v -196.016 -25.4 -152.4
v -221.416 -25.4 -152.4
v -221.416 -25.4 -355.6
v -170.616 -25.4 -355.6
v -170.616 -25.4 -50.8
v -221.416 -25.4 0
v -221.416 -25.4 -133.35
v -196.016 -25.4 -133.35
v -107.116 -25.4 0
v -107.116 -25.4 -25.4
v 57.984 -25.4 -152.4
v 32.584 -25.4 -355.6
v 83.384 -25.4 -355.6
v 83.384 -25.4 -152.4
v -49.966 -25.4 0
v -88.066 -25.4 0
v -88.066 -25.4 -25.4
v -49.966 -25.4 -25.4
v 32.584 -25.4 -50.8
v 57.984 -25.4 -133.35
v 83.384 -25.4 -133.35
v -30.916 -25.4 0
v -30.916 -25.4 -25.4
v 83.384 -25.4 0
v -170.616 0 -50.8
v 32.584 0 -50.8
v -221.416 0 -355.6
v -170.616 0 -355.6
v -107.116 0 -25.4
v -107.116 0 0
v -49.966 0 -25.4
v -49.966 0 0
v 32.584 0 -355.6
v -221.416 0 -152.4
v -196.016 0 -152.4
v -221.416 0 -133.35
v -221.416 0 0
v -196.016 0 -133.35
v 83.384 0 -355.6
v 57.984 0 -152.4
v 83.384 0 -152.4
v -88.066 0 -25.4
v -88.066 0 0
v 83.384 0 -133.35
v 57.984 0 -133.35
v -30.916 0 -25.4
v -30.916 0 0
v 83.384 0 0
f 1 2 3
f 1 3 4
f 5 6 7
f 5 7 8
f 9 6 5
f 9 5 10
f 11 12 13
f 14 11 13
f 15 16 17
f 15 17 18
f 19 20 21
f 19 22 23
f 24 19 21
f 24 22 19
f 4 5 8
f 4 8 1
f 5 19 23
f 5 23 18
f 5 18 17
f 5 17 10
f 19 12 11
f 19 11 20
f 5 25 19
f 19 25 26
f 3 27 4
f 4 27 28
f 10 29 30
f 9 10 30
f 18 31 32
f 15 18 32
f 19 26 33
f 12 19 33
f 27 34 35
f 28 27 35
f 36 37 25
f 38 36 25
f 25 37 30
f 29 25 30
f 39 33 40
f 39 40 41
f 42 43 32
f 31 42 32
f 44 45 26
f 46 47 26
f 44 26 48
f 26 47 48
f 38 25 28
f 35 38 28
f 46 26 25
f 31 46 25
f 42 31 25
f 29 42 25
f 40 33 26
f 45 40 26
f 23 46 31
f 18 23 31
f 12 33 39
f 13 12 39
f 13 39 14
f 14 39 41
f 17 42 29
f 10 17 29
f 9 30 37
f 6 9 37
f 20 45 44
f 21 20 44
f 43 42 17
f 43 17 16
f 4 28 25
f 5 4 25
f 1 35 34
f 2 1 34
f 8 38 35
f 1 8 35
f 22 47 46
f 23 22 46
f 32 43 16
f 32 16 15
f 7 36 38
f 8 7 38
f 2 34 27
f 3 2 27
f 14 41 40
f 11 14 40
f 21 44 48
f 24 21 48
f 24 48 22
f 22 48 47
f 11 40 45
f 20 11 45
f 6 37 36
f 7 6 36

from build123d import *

# Parameters (mm, degrees)
F0_W     = 50.8
F0_H     = 50.8
F0_W_2   = 38.1
F0_H_2   = 25.4
F1_DEPTH = 25.4


# Not quite as in the source:
# - a feature names something its author has since deleted; it is built from what else it names


with BuildPart() as f1:
    # F0 (on Front) → F1 (new body)
    with BuildSketch(Plane.XZ):
        with Locations((-196.0164945363, -25.4)):
            Rectangle(F0_W, F0_H)
        with Locations((57.9835054637, -25.4)):
            Rectangle(F0_W, F0_H)
        Polygon((32.5835054637, -355.6), (83.3835054637, -355.6), (83.3835054637, -152.4), (57.9835054637, -152.4), (57.9835054637, -133.35), (83.3835054637, -133.35), (83.3835054637, -50.8), (32.5835054637, -50.8), align=None)
        Polygon((-170.6164945363, -355.6), (-170.6164945363, -50.8), (-221.4164945363, -50.8), (-221.4164945363, -133.35), (-196.0164945363, -133.35), (-196.0164945363, -152.4), (-221.4164945363, -152.4), (-221.4164945363, -355.6), align=None)
        Polygon((-170.6164945363, -50.8), (32.5835054637, -50.8), (32.5835054637, 0), (-30.9164945363, 0), (-30.9164945363, -25.4), (-49.9664945363, -25.4), (-88.0664945363, -25.4), (-107.1164945363, -25.4), (-107.1164945363, 0), (-170.6164945363, 0), align=None)
        with Locations((-69.0164945363, -12.7)):
            Rectangle(F0_W_2, F0_H_2)
    extrude(amount=F1_DEPTH)


solid = f1.part
